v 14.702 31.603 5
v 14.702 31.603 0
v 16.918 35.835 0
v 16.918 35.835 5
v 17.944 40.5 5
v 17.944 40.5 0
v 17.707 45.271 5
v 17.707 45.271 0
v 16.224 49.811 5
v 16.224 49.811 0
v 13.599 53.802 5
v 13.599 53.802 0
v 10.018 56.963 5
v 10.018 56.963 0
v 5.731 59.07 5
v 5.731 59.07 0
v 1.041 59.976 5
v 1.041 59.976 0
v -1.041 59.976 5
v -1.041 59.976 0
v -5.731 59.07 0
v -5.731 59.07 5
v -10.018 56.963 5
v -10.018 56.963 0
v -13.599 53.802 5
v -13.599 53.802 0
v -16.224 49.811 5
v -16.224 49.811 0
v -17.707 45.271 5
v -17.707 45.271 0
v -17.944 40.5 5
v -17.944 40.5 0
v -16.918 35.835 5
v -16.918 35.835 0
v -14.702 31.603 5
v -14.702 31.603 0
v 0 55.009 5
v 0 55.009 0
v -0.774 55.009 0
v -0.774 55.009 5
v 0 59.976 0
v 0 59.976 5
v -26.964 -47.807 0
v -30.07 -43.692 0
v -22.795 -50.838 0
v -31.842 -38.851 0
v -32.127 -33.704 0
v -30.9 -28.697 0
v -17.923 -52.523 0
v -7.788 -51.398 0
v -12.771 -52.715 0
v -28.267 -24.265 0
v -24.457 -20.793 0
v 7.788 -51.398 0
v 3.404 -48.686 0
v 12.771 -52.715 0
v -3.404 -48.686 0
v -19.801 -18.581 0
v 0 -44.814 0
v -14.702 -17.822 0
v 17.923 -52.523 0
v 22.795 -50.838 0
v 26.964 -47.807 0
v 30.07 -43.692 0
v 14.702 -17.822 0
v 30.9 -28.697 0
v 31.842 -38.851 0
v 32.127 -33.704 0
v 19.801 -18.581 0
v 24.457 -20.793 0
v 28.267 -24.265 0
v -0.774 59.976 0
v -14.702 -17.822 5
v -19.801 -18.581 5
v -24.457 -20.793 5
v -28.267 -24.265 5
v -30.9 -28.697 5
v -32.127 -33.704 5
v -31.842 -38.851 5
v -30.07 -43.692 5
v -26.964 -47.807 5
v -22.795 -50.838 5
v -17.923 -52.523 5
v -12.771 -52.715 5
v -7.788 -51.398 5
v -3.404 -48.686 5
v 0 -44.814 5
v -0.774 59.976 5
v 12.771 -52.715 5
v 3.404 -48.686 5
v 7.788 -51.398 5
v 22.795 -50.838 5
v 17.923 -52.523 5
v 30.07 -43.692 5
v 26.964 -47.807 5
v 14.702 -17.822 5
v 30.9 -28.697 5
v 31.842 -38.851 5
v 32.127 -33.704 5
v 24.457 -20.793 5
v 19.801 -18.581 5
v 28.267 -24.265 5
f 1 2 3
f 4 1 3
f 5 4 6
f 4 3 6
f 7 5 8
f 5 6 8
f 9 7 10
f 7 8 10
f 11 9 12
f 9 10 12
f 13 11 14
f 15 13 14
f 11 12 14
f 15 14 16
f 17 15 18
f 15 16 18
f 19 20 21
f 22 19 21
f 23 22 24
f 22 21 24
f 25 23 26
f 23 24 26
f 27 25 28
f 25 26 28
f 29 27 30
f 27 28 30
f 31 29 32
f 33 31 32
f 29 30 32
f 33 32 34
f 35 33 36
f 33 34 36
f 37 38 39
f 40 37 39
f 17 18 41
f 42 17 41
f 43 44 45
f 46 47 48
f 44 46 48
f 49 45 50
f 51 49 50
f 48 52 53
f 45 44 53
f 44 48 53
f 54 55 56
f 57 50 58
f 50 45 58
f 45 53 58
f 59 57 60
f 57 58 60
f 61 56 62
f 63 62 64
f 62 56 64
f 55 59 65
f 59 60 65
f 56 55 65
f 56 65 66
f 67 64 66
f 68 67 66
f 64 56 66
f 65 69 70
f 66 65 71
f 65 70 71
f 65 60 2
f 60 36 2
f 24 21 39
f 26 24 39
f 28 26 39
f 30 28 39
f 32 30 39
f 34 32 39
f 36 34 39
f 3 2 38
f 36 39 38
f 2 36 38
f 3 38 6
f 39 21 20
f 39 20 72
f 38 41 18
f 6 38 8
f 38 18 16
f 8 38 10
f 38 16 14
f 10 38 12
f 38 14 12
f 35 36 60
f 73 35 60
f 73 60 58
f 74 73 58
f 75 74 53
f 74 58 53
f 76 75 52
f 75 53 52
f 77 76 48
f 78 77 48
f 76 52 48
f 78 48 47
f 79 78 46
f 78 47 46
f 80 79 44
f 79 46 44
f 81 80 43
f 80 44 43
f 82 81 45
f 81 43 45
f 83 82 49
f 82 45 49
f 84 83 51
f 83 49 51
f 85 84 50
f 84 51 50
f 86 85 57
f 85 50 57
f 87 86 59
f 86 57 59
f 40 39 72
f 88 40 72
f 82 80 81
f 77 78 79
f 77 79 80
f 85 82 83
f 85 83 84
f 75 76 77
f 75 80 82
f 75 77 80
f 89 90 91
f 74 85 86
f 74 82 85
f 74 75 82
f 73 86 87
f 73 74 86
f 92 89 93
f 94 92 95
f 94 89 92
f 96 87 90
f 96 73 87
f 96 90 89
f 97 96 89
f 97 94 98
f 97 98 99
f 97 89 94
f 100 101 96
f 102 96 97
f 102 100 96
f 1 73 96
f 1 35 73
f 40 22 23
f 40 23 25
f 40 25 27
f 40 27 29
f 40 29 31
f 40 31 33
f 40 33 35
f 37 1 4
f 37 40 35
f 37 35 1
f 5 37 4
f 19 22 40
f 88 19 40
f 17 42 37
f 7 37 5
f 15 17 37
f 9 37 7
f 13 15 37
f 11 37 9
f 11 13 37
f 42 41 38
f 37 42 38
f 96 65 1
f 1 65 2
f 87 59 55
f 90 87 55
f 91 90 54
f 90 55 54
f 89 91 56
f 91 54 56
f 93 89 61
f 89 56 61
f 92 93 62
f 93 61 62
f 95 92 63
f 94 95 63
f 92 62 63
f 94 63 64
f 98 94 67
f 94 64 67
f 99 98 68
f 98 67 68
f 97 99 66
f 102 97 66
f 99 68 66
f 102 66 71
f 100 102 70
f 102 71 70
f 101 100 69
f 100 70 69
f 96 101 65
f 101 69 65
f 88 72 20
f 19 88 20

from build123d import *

# Parameters (mm, degrees)
F1_DEPTH = 5


with BuildPart() as f1:
    # F0 (on Top) → F1 (new body)
    with BuildSketch(Plane.XY):
        with BuildLine():
            Line((14.701757, -17.821519), (14.701757, 31.603123))
            ThreePointArc((14.701757, 31.603123), (16.224064, 49.811273), (1.041059, 59.976434))
            Line((1.041059, 59.976434), (0, 59.976434))
            Line((0, 59.976434), (0, 55.009447))
            Line((0, 55.009447), (-0.774187, 55.009447))
            Line((-0.774187, 55.009447), (-0.774187, 59.976434))
            Line((-0.774187, 59.976434), (-1.041059, 59.976434))
            ThreePointArc((-1.041059, 59.976434), (-16.224064, 49.811273), (-14.701757, 31.603123))
            Line((-14.701757, 31.603123), (-14.701757, -17.821519))
            ThreePointArc((-14.701757, -17.821519), (-30.07006, -43.692018), (0, -44.81406))
            ThreePointArc((0, -44.81406), (30.07006, -43.692018), (14.701757, -17.821519))
        make_face()
    extrude(amount=F1_DEPTH)


solid = f1.part
